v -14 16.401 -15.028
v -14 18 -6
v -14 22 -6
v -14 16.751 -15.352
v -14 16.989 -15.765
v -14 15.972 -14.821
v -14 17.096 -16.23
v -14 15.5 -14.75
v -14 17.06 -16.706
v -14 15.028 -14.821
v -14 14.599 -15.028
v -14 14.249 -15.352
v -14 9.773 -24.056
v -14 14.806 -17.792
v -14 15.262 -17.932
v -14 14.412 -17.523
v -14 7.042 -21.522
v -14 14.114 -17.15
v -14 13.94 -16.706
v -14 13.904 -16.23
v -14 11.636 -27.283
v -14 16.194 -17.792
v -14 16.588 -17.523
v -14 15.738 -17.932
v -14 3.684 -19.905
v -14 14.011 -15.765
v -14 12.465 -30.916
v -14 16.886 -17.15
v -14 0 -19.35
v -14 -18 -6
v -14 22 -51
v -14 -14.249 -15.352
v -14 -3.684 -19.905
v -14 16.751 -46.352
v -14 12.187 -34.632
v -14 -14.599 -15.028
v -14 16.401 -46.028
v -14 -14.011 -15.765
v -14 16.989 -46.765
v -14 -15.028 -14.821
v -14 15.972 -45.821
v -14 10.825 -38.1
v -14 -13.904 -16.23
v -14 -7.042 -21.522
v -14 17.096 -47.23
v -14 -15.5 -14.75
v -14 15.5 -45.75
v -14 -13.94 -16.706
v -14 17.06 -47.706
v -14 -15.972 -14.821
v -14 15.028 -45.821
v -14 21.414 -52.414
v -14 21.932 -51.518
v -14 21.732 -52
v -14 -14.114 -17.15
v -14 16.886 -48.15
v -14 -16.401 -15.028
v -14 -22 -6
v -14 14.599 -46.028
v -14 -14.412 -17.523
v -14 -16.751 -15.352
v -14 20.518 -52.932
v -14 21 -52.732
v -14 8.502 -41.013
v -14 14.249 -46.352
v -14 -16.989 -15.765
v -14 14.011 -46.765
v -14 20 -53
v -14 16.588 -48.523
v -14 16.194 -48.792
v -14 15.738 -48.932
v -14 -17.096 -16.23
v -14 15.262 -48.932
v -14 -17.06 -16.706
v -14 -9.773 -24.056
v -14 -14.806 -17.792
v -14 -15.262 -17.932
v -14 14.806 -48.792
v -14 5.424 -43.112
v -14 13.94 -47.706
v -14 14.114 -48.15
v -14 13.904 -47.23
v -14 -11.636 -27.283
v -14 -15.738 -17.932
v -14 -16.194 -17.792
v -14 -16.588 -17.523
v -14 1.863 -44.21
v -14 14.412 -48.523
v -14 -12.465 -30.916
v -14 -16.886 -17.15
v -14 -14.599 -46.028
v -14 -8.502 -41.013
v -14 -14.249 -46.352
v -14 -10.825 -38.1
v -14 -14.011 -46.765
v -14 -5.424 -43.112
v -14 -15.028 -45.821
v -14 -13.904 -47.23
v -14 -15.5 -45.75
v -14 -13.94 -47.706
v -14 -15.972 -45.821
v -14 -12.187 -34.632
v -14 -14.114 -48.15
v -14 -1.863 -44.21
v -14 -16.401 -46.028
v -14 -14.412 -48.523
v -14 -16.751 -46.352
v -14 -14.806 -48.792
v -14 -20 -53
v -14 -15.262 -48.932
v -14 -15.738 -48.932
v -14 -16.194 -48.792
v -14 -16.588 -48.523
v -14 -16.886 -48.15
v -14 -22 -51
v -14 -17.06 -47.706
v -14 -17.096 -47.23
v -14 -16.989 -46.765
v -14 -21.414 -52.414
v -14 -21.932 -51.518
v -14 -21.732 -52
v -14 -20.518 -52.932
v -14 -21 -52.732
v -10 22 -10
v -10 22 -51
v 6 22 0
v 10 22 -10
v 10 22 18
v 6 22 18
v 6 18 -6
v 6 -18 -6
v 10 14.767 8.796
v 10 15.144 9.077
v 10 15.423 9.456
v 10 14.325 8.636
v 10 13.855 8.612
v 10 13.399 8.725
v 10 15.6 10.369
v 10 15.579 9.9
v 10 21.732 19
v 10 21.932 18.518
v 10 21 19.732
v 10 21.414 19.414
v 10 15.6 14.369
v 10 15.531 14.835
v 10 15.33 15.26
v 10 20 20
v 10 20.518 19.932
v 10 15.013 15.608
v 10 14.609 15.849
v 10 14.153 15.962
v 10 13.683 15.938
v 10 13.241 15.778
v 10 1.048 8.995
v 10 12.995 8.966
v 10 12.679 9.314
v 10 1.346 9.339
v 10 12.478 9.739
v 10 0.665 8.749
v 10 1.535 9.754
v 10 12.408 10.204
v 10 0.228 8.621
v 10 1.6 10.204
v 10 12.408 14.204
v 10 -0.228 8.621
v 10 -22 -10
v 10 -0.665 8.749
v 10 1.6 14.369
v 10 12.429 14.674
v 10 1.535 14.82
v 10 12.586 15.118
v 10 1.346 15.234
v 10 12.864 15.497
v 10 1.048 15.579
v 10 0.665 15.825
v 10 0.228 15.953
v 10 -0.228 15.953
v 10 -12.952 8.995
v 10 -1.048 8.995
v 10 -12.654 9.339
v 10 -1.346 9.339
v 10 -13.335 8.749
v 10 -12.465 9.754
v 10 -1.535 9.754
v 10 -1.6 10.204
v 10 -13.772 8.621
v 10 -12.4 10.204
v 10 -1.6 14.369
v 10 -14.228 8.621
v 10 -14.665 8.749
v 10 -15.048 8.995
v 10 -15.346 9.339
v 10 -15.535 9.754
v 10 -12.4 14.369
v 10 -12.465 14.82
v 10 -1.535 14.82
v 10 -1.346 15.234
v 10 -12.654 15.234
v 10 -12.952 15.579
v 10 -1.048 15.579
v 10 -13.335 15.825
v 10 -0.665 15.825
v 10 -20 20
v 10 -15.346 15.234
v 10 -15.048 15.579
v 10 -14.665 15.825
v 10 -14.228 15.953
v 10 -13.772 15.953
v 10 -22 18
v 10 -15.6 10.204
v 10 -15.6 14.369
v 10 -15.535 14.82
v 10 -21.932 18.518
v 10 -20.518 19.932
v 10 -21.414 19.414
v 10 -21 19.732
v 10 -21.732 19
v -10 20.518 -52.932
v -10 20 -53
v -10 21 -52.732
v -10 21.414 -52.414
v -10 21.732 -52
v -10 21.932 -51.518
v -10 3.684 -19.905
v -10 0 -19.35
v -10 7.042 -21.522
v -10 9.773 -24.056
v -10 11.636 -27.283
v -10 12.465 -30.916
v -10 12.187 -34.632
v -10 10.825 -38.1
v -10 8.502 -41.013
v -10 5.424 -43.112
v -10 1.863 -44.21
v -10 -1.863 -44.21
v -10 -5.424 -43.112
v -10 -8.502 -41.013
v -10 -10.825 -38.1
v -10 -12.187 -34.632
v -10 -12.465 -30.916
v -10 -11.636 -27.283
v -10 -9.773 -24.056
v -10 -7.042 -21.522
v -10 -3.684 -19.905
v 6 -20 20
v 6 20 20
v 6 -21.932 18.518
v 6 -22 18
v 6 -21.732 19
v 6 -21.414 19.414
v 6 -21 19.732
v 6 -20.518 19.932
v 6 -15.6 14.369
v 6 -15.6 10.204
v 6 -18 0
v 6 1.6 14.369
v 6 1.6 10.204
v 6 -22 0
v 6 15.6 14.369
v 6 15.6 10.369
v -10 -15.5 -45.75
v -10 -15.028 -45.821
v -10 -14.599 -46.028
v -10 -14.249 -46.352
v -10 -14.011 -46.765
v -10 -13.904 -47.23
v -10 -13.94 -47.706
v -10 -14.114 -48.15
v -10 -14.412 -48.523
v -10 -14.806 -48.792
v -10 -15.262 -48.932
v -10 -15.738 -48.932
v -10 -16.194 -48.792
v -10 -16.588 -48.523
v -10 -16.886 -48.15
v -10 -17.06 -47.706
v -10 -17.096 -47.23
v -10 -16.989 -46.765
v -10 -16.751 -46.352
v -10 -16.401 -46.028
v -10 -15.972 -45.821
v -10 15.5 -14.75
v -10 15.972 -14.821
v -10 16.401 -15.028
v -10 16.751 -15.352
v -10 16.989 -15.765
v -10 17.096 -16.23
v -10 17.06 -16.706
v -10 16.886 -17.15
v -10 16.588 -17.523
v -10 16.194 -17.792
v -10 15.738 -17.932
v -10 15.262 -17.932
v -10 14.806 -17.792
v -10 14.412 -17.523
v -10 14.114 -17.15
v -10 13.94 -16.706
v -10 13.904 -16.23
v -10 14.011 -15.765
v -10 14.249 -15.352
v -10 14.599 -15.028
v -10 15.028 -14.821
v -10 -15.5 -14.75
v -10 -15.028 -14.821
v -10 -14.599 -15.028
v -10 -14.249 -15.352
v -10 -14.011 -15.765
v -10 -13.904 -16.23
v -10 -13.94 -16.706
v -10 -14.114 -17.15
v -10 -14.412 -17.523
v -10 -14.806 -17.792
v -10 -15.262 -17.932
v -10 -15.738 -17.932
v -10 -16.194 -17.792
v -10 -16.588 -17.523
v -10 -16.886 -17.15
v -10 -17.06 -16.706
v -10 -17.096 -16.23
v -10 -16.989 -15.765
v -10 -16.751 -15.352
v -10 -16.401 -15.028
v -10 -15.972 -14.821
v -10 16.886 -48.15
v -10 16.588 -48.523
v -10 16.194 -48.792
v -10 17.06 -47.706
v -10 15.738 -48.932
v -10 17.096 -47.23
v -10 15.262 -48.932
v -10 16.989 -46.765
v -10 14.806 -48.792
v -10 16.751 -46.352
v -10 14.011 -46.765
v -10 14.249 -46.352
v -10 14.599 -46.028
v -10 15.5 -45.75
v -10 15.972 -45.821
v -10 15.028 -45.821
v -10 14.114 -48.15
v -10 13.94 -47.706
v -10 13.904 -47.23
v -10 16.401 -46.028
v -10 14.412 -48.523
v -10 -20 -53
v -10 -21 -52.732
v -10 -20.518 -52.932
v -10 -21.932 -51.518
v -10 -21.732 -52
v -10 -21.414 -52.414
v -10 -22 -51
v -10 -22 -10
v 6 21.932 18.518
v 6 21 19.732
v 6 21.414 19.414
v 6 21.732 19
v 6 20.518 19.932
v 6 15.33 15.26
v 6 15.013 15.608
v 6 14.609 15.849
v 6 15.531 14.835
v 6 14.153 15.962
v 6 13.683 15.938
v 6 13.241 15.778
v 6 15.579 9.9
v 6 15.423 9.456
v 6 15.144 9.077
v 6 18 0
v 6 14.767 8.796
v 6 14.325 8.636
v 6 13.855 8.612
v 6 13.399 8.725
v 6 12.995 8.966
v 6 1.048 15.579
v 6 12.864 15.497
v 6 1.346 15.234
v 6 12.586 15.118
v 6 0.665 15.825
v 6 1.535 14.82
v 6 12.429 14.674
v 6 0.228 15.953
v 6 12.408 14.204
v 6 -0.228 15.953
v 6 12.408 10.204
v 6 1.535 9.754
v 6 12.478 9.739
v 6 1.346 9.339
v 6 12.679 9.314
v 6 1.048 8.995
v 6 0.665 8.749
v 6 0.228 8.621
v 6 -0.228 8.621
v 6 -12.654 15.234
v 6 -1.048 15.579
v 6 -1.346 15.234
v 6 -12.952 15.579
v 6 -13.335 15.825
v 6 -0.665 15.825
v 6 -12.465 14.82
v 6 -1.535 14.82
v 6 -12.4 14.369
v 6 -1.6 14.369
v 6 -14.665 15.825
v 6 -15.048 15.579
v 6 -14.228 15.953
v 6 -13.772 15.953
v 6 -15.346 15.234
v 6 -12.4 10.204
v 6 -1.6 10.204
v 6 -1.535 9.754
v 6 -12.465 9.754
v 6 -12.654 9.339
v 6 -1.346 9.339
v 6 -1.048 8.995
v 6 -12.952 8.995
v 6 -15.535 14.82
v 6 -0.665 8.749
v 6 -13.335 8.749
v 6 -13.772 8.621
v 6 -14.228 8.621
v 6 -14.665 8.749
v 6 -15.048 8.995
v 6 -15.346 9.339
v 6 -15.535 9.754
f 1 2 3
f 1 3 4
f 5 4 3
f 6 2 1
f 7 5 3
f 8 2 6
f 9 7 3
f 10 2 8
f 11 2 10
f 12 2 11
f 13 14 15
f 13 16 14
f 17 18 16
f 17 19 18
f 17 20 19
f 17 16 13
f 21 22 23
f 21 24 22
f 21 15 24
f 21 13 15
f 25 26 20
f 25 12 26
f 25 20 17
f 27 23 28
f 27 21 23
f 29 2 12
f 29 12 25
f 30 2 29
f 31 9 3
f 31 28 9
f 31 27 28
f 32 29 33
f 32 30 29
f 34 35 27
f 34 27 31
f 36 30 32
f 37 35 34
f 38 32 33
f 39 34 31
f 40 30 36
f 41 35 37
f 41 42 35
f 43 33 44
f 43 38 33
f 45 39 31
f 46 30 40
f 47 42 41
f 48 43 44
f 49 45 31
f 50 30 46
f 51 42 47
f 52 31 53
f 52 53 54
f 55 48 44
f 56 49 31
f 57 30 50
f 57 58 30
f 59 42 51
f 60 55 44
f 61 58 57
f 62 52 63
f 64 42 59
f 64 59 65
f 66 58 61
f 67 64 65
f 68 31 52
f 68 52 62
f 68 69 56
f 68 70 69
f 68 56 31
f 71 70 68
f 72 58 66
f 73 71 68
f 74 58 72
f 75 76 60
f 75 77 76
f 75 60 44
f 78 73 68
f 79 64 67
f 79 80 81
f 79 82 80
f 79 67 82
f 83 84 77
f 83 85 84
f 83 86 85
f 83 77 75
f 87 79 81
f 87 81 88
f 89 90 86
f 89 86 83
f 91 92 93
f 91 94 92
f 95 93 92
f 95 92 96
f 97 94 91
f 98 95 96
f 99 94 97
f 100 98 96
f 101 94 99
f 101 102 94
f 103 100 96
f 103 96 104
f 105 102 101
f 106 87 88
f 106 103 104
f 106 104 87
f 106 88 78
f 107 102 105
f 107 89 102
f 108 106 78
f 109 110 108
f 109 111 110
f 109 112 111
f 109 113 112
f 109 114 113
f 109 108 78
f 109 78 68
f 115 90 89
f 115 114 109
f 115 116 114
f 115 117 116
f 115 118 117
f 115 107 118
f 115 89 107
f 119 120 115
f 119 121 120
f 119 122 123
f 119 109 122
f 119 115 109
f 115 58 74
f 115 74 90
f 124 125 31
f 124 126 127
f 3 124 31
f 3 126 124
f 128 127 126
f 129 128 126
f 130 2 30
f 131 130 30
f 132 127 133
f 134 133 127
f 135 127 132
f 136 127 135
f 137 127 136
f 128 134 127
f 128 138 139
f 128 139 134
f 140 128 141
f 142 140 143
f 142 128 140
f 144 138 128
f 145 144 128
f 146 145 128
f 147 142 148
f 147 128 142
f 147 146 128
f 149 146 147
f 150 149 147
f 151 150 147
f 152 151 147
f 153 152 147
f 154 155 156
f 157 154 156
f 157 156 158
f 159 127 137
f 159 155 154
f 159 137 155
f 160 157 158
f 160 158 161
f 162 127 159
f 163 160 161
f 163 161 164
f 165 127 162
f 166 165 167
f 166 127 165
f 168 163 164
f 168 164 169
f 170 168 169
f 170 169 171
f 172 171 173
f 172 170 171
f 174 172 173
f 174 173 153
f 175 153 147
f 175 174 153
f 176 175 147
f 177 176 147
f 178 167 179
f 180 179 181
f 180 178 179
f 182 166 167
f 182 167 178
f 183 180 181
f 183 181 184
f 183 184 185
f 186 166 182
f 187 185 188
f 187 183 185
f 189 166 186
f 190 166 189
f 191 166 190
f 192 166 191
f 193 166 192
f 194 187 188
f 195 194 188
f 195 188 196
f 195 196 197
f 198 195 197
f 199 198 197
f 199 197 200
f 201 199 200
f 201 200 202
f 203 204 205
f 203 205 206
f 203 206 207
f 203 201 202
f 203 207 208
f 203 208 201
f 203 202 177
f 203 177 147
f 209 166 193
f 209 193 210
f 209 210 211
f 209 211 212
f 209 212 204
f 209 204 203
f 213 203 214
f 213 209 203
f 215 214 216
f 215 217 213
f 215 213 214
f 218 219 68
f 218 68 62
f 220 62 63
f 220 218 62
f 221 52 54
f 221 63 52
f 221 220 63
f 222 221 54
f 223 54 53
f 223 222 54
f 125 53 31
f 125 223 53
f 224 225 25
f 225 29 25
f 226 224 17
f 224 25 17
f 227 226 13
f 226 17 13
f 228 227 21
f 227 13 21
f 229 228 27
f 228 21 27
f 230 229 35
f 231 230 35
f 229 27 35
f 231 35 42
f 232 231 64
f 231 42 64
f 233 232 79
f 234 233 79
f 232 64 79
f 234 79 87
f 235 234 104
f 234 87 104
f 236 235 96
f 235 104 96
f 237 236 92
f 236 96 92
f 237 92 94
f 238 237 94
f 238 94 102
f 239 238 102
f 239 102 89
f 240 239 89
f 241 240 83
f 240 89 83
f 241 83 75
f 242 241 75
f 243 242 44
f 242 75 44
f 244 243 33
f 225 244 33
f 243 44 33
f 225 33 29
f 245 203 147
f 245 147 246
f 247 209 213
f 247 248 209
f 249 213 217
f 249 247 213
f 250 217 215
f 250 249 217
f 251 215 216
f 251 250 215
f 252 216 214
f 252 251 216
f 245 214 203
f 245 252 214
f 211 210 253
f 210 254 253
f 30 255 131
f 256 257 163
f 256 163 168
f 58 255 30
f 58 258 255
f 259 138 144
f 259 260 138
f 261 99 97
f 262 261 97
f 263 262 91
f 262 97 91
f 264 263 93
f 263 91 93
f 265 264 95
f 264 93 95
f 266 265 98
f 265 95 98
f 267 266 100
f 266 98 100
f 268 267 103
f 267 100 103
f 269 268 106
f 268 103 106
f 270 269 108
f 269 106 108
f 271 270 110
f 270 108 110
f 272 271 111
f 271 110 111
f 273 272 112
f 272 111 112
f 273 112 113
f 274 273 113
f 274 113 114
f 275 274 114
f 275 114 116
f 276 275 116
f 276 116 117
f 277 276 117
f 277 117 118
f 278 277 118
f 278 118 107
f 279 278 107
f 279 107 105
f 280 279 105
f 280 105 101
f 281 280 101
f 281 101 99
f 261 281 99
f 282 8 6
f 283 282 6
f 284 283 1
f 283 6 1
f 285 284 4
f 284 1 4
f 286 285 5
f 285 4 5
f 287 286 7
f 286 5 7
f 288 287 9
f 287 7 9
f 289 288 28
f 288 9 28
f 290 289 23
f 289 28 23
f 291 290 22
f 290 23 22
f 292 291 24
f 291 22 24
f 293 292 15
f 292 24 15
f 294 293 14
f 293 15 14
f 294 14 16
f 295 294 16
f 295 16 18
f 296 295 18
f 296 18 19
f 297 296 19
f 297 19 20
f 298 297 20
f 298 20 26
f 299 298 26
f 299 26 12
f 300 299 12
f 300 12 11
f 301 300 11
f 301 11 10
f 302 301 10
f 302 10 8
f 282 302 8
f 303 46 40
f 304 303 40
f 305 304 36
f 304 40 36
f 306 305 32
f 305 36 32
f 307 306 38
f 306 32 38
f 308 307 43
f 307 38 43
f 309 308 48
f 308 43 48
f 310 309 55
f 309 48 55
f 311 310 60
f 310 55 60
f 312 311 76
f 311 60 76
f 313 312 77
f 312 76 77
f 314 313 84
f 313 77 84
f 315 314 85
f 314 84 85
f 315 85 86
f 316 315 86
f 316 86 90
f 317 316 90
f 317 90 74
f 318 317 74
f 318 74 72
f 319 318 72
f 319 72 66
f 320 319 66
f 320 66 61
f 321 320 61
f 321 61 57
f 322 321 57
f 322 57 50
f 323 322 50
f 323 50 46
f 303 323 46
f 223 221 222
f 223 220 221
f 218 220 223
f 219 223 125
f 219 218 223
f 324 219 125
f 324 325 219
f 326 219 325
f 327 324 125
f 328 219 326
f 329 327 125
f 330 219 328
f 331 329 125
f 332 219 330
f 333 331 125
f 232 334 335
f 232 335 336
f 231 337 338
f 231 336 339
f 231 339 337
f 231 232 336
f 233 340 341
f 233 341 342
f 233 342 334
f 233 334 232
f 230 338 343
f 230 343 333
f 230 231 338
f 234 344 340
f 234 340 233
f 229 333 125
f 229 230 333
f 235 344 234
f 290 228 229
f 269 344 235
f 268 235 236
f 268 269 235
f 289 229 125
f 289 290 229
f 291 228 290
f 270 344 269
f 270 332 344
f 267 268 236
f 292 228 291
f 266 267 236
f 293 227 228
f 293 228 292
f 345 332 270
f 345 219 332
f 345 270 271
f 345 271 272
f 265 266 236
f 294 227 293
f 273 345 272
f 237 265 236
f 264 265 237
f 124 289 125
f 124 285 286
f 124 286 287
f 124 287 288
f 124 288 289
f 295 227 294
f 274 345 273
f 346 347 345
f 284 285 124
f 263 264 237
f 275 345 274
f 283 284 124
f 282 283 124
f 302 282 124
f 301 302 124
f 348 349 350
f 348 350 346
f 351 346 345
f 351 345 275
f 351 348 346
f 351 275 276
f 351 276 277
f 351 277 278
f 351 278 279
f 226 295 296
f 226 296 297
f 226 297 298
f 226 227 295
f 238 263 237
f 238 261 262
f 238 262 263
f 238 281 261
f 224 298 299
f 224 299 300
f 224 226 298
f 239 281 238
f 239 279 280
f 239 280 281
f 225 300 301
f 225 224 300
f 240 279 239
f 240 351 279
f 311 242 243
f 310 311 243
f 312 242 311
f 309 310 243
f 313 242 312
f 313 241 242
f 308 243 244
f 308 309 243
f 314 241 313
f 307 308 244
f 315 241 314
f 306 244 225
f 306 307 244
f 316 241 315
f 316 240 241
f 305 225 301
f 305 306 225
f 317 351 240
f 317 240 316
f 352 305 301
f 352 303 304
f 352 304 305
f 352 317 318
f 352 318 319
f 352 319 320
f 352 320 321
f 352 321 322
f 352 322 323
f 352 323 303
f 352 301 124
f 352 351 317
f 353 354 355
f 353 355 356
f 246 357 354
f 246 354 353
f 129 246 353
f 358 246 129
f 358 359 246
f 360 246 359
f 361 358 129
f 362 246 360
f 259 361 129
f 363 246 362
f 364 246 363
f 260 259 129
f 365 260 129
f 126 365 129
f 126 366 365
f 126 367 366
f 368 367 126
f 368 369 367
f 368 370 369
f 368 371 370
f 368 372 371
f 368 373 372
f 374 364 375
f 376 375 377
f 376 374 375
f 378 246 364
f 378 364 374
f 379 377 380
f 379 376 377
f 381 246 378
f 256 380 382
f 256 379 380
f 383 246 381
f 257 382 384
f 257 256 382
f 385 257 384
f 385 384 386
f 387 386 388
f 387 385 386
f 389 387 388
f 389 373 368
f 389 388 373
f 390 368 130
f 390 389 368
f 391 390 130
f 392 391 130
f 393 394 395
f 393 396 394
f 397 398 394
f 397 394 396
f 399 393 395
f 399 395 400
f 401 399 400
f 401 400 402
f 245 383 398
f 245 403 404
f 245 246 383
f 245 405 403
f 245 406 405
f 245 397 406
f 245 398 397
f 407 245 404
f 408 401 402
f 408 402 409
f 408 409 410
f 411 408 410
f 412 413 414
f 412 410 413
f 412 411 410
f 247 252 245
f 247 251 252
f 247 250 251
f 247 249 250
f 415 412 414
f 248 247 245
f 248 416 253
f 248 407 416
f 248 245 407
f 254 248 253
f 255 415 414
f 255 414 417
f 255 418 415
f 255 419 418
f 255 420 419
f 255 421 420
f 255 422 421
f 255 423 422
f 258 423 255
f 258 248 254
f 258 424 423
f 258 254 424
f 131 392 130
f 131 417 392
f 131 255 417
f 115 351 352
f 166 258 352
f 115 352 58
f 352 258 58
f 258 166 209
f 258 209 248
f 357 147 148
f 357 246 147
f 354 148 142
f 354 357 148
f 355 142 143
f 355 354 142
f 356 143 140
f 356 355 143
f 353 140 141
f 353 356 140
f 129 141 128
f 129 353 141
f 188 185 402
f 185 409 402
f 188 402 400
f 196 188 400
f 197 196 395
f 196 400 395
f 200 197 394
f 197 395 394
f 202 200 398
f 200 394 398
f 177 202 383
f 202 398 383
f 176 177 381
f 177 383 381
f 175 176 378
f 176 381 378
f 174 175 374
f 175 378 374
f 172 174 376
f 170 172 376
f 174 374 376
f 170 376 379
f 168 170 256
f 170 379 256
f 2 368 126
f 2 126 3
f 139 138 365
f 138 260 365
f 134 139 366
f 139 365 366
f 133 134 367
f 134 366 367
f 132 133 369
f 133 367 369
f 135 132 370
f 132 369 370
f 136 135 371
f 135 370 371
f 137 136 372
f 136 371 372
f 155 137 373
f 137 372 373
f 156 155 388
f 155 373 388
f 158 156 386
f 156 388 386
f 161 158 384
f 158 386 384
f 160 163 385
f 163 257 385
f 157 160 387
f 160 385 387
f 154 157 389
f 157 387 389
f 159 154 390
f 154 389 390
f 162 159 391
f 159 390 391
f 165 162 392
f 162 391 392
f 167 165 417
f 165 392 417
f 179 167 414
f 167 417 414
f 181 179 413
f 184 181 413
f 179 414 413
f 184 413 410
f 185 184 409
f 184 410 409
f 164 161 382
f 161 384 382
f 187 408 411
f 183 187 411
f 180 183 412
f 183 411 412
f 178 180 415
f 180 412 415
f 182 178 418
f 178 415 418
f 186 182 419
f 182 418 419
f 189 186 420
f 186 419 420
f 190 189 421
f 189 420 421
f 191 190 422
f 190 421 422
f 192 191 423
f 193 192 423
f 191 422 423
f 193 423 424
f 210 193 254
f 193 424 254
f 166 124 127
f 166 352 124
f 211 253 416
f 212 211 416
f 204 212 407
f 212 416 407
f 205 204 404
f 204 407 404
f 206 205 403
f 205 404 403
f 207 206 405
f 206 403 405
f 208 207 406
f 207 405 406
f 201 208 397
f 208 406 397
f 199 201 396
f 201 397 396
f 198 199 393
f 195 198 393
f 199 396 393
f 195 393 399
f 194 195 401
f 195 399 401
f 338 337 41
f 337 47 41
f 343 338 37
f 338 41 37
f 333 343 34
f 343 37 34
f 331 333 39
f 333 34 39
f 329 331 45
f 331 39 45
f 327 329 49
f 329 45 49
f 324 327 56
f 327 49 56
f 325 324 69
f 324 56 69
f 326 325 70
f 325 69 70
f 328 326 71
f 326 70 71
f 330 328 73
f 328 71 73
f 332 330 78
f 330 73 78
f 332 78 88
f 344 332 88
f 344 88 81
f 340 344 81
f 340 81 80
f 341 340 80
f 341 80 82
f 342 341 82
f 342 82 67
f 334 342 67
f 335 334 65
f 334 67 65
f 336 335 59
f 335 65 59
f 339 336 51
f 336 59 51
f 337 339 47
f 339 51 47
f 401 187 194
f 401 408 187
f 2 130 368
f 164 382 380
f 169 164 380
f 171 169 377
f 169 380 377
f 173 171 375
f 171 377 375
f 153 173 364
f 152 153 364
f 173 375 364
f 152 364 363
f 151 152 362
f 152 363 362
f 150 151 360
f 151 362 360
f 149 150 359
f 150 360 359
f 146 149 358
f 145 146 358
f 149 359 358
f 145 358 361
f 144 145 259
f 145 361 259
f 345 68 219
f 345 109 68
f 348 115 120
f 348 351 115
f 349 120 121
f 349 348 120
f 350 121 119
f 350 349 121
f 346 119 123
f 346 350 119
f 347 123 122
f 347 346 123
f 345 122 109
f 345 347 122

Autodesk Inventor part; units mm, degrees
ref_plane "YZ Plane" through (0, 0, 0) normal (1, 0, 0) x (0, 1, 0)
ref_plane "XZ Plane" through (0, 0, 0) normal (0, 1, 0) x (-1, 0, 0)
ref_plane "XY Plane" through (0, 0, 0) normal (0, 0, 1) x (1, 0, 0)
sketch "Sketch1" plane through (0, 0, 0) normal (0, 1, 0) x (-1, 0, 0)
  line L0 (-6, 20) -> (-6, 0)
  line L1 (-6, 0) -> (14, -6)
  line L2 (14, -6) -> (14, -53)
  line L3 (14, -53) -> (10, -53)
  line L4 (10, -53) -> (10, -10)
  line L5 (-10, -10) -> (-10, 20)
  line L6 (-10, 20) -> (-6, 20)
  line L7 (10, -10) -> (-10, -10)
  point P0 (0, 0)
  point P1 (0, -10)
  dimension "d0" = 20
  dimension "d1" = 43
  dimension "d2" = 4
  dimension "d3" = 4
  dimension "d4" = 30
  dimension "d5" = 20
  dimension "d6" = 4
extrude "Extrusion1" add sketch "Sketch1" along normal mid plane 44
sketch "Sketch2" plane through (-14, -22, -6) normal (-1, 0, 0) x (0, 0, 1)
  line L0 (0, 44) -> (0, 0) projected
  line L1 (-47, 44) -> (0, 44) projected
  line L2 (-47, 44) -> (-47, 0) projected
  line L3 (0, 0) -> (-47, 0) projected
  circle A0 centre (-25.85, 22) radius 12.5
  circle A1 centre (-41.35, 37.5) radius 1.6
  circle A2 centre (-41.35, 6.5) radius 1.6
  circle A3 centre (-10.35, 37.5) radius 1.6
  circle A4 centre (-10.35, 6.5) radius 1.6
  point P0 (6, 22)
  point P1 (-47, 22)
  dimension "d9" = 3.2
  dimension "d10" = 25
  dimension "d11" = 21.15
  dimension "d12" = 31
  dimension "d13" = 31
  dimension "d14" = 15.5
  dimension "d15" = 15.5
extrude "Extrusion2" cut sketch "Sketch2" against normal up to next contours A0 | A1 | A2 | A3 | A4
sketch "Sketch3" plane through (6, -22, 20) normal (-1, 0, 0) x (0, 0, 1)
  arc A0 (-5.7957, 34.4085) -> (-5.6306, 37.6) centre (-5.6306, 36) ccw
  arc A1 (-9.6306, 37.6) -> (-9.7957, 34.4085) centre (-9.7957, 36.0085) ccw
  arc A2 (-5.6306, 20.4) -> (-5.6306, 23.6) centre (-5.6306, 22) ccw
  arc A3 (-9.7957, 23.6) -> (-9.7957, 20.4) centre (-9.7957, 22) ccw
  arc A4 (-5.6306, 6.4) -> (-5.6306, 9.6) centre (-5.6306, 8) ccw
  arc A5 (-9.7957, 9.6) -> (-9.7957, 6.4) centre (-9.7957, 8) ccw
  line L0 (-9.6306, 37.6) -> (-5.6306, 37.6)
  line L1 (-9.7957, 34.4085) -> (-5.7957, 34.4085)
  line L2 (-9.7957, 23.6) -> (-5.6306, 23.6)
  line L3 (-9.7957, 20.4) -> (-5.6306, 20.4)
  line L4 (-9.7957, 9.6) -> (-5.6306, 9.6)
  line L5 (-9.7957, 6.4) -> (-5.6306, 6.4)
  line L6 (-20, 44) -> (0, 44) projected
  line L7 (0, 0) -> (-20, 0) projected
  line L8 (-5.6306, 36) -> (-5.6306, 8) construction
  point P0 (-20, 22)
  dimension "d18" = 3.2
  dimension "d19" = 4
  dimension "d20" = 8
  dimension "d21" = 8
extrude "Extrusion3" cut sketch "Sketch3" against normal up to next
sketch "Sketch4" plane through (-14, -22, -6) normal (-1, 0, 0) x (0, 0, 1)
  line L0 (0, 44) -> (0, 0) projected
  line L1 (0, 40) -> (8.5563, 40)
  line L2 (8.5563, 40) -> (8.5563, 4)
  line L3 (8.5563, 4) -> (0, 4)
  line L4 (0, 4) -> (0, 40)
  point P0 (6, 22)
  dimension "d26" = 4
  dimension "d27" = 4
extrude "Extrusion4" cut sketch "Sketch4" against normal up to surface (20 mm away)
fillet "Fillet1" radius 2 4 edges at (-12, 22, -53) (-12, -22, -53) (8, -22, 20) (8, 22, 20)
equation "\"d14\" = 0.5 * d13"
equation "\"d15\" = 0.5 * d12"
properties part number "nema17-mount-bottom-z-axis"
